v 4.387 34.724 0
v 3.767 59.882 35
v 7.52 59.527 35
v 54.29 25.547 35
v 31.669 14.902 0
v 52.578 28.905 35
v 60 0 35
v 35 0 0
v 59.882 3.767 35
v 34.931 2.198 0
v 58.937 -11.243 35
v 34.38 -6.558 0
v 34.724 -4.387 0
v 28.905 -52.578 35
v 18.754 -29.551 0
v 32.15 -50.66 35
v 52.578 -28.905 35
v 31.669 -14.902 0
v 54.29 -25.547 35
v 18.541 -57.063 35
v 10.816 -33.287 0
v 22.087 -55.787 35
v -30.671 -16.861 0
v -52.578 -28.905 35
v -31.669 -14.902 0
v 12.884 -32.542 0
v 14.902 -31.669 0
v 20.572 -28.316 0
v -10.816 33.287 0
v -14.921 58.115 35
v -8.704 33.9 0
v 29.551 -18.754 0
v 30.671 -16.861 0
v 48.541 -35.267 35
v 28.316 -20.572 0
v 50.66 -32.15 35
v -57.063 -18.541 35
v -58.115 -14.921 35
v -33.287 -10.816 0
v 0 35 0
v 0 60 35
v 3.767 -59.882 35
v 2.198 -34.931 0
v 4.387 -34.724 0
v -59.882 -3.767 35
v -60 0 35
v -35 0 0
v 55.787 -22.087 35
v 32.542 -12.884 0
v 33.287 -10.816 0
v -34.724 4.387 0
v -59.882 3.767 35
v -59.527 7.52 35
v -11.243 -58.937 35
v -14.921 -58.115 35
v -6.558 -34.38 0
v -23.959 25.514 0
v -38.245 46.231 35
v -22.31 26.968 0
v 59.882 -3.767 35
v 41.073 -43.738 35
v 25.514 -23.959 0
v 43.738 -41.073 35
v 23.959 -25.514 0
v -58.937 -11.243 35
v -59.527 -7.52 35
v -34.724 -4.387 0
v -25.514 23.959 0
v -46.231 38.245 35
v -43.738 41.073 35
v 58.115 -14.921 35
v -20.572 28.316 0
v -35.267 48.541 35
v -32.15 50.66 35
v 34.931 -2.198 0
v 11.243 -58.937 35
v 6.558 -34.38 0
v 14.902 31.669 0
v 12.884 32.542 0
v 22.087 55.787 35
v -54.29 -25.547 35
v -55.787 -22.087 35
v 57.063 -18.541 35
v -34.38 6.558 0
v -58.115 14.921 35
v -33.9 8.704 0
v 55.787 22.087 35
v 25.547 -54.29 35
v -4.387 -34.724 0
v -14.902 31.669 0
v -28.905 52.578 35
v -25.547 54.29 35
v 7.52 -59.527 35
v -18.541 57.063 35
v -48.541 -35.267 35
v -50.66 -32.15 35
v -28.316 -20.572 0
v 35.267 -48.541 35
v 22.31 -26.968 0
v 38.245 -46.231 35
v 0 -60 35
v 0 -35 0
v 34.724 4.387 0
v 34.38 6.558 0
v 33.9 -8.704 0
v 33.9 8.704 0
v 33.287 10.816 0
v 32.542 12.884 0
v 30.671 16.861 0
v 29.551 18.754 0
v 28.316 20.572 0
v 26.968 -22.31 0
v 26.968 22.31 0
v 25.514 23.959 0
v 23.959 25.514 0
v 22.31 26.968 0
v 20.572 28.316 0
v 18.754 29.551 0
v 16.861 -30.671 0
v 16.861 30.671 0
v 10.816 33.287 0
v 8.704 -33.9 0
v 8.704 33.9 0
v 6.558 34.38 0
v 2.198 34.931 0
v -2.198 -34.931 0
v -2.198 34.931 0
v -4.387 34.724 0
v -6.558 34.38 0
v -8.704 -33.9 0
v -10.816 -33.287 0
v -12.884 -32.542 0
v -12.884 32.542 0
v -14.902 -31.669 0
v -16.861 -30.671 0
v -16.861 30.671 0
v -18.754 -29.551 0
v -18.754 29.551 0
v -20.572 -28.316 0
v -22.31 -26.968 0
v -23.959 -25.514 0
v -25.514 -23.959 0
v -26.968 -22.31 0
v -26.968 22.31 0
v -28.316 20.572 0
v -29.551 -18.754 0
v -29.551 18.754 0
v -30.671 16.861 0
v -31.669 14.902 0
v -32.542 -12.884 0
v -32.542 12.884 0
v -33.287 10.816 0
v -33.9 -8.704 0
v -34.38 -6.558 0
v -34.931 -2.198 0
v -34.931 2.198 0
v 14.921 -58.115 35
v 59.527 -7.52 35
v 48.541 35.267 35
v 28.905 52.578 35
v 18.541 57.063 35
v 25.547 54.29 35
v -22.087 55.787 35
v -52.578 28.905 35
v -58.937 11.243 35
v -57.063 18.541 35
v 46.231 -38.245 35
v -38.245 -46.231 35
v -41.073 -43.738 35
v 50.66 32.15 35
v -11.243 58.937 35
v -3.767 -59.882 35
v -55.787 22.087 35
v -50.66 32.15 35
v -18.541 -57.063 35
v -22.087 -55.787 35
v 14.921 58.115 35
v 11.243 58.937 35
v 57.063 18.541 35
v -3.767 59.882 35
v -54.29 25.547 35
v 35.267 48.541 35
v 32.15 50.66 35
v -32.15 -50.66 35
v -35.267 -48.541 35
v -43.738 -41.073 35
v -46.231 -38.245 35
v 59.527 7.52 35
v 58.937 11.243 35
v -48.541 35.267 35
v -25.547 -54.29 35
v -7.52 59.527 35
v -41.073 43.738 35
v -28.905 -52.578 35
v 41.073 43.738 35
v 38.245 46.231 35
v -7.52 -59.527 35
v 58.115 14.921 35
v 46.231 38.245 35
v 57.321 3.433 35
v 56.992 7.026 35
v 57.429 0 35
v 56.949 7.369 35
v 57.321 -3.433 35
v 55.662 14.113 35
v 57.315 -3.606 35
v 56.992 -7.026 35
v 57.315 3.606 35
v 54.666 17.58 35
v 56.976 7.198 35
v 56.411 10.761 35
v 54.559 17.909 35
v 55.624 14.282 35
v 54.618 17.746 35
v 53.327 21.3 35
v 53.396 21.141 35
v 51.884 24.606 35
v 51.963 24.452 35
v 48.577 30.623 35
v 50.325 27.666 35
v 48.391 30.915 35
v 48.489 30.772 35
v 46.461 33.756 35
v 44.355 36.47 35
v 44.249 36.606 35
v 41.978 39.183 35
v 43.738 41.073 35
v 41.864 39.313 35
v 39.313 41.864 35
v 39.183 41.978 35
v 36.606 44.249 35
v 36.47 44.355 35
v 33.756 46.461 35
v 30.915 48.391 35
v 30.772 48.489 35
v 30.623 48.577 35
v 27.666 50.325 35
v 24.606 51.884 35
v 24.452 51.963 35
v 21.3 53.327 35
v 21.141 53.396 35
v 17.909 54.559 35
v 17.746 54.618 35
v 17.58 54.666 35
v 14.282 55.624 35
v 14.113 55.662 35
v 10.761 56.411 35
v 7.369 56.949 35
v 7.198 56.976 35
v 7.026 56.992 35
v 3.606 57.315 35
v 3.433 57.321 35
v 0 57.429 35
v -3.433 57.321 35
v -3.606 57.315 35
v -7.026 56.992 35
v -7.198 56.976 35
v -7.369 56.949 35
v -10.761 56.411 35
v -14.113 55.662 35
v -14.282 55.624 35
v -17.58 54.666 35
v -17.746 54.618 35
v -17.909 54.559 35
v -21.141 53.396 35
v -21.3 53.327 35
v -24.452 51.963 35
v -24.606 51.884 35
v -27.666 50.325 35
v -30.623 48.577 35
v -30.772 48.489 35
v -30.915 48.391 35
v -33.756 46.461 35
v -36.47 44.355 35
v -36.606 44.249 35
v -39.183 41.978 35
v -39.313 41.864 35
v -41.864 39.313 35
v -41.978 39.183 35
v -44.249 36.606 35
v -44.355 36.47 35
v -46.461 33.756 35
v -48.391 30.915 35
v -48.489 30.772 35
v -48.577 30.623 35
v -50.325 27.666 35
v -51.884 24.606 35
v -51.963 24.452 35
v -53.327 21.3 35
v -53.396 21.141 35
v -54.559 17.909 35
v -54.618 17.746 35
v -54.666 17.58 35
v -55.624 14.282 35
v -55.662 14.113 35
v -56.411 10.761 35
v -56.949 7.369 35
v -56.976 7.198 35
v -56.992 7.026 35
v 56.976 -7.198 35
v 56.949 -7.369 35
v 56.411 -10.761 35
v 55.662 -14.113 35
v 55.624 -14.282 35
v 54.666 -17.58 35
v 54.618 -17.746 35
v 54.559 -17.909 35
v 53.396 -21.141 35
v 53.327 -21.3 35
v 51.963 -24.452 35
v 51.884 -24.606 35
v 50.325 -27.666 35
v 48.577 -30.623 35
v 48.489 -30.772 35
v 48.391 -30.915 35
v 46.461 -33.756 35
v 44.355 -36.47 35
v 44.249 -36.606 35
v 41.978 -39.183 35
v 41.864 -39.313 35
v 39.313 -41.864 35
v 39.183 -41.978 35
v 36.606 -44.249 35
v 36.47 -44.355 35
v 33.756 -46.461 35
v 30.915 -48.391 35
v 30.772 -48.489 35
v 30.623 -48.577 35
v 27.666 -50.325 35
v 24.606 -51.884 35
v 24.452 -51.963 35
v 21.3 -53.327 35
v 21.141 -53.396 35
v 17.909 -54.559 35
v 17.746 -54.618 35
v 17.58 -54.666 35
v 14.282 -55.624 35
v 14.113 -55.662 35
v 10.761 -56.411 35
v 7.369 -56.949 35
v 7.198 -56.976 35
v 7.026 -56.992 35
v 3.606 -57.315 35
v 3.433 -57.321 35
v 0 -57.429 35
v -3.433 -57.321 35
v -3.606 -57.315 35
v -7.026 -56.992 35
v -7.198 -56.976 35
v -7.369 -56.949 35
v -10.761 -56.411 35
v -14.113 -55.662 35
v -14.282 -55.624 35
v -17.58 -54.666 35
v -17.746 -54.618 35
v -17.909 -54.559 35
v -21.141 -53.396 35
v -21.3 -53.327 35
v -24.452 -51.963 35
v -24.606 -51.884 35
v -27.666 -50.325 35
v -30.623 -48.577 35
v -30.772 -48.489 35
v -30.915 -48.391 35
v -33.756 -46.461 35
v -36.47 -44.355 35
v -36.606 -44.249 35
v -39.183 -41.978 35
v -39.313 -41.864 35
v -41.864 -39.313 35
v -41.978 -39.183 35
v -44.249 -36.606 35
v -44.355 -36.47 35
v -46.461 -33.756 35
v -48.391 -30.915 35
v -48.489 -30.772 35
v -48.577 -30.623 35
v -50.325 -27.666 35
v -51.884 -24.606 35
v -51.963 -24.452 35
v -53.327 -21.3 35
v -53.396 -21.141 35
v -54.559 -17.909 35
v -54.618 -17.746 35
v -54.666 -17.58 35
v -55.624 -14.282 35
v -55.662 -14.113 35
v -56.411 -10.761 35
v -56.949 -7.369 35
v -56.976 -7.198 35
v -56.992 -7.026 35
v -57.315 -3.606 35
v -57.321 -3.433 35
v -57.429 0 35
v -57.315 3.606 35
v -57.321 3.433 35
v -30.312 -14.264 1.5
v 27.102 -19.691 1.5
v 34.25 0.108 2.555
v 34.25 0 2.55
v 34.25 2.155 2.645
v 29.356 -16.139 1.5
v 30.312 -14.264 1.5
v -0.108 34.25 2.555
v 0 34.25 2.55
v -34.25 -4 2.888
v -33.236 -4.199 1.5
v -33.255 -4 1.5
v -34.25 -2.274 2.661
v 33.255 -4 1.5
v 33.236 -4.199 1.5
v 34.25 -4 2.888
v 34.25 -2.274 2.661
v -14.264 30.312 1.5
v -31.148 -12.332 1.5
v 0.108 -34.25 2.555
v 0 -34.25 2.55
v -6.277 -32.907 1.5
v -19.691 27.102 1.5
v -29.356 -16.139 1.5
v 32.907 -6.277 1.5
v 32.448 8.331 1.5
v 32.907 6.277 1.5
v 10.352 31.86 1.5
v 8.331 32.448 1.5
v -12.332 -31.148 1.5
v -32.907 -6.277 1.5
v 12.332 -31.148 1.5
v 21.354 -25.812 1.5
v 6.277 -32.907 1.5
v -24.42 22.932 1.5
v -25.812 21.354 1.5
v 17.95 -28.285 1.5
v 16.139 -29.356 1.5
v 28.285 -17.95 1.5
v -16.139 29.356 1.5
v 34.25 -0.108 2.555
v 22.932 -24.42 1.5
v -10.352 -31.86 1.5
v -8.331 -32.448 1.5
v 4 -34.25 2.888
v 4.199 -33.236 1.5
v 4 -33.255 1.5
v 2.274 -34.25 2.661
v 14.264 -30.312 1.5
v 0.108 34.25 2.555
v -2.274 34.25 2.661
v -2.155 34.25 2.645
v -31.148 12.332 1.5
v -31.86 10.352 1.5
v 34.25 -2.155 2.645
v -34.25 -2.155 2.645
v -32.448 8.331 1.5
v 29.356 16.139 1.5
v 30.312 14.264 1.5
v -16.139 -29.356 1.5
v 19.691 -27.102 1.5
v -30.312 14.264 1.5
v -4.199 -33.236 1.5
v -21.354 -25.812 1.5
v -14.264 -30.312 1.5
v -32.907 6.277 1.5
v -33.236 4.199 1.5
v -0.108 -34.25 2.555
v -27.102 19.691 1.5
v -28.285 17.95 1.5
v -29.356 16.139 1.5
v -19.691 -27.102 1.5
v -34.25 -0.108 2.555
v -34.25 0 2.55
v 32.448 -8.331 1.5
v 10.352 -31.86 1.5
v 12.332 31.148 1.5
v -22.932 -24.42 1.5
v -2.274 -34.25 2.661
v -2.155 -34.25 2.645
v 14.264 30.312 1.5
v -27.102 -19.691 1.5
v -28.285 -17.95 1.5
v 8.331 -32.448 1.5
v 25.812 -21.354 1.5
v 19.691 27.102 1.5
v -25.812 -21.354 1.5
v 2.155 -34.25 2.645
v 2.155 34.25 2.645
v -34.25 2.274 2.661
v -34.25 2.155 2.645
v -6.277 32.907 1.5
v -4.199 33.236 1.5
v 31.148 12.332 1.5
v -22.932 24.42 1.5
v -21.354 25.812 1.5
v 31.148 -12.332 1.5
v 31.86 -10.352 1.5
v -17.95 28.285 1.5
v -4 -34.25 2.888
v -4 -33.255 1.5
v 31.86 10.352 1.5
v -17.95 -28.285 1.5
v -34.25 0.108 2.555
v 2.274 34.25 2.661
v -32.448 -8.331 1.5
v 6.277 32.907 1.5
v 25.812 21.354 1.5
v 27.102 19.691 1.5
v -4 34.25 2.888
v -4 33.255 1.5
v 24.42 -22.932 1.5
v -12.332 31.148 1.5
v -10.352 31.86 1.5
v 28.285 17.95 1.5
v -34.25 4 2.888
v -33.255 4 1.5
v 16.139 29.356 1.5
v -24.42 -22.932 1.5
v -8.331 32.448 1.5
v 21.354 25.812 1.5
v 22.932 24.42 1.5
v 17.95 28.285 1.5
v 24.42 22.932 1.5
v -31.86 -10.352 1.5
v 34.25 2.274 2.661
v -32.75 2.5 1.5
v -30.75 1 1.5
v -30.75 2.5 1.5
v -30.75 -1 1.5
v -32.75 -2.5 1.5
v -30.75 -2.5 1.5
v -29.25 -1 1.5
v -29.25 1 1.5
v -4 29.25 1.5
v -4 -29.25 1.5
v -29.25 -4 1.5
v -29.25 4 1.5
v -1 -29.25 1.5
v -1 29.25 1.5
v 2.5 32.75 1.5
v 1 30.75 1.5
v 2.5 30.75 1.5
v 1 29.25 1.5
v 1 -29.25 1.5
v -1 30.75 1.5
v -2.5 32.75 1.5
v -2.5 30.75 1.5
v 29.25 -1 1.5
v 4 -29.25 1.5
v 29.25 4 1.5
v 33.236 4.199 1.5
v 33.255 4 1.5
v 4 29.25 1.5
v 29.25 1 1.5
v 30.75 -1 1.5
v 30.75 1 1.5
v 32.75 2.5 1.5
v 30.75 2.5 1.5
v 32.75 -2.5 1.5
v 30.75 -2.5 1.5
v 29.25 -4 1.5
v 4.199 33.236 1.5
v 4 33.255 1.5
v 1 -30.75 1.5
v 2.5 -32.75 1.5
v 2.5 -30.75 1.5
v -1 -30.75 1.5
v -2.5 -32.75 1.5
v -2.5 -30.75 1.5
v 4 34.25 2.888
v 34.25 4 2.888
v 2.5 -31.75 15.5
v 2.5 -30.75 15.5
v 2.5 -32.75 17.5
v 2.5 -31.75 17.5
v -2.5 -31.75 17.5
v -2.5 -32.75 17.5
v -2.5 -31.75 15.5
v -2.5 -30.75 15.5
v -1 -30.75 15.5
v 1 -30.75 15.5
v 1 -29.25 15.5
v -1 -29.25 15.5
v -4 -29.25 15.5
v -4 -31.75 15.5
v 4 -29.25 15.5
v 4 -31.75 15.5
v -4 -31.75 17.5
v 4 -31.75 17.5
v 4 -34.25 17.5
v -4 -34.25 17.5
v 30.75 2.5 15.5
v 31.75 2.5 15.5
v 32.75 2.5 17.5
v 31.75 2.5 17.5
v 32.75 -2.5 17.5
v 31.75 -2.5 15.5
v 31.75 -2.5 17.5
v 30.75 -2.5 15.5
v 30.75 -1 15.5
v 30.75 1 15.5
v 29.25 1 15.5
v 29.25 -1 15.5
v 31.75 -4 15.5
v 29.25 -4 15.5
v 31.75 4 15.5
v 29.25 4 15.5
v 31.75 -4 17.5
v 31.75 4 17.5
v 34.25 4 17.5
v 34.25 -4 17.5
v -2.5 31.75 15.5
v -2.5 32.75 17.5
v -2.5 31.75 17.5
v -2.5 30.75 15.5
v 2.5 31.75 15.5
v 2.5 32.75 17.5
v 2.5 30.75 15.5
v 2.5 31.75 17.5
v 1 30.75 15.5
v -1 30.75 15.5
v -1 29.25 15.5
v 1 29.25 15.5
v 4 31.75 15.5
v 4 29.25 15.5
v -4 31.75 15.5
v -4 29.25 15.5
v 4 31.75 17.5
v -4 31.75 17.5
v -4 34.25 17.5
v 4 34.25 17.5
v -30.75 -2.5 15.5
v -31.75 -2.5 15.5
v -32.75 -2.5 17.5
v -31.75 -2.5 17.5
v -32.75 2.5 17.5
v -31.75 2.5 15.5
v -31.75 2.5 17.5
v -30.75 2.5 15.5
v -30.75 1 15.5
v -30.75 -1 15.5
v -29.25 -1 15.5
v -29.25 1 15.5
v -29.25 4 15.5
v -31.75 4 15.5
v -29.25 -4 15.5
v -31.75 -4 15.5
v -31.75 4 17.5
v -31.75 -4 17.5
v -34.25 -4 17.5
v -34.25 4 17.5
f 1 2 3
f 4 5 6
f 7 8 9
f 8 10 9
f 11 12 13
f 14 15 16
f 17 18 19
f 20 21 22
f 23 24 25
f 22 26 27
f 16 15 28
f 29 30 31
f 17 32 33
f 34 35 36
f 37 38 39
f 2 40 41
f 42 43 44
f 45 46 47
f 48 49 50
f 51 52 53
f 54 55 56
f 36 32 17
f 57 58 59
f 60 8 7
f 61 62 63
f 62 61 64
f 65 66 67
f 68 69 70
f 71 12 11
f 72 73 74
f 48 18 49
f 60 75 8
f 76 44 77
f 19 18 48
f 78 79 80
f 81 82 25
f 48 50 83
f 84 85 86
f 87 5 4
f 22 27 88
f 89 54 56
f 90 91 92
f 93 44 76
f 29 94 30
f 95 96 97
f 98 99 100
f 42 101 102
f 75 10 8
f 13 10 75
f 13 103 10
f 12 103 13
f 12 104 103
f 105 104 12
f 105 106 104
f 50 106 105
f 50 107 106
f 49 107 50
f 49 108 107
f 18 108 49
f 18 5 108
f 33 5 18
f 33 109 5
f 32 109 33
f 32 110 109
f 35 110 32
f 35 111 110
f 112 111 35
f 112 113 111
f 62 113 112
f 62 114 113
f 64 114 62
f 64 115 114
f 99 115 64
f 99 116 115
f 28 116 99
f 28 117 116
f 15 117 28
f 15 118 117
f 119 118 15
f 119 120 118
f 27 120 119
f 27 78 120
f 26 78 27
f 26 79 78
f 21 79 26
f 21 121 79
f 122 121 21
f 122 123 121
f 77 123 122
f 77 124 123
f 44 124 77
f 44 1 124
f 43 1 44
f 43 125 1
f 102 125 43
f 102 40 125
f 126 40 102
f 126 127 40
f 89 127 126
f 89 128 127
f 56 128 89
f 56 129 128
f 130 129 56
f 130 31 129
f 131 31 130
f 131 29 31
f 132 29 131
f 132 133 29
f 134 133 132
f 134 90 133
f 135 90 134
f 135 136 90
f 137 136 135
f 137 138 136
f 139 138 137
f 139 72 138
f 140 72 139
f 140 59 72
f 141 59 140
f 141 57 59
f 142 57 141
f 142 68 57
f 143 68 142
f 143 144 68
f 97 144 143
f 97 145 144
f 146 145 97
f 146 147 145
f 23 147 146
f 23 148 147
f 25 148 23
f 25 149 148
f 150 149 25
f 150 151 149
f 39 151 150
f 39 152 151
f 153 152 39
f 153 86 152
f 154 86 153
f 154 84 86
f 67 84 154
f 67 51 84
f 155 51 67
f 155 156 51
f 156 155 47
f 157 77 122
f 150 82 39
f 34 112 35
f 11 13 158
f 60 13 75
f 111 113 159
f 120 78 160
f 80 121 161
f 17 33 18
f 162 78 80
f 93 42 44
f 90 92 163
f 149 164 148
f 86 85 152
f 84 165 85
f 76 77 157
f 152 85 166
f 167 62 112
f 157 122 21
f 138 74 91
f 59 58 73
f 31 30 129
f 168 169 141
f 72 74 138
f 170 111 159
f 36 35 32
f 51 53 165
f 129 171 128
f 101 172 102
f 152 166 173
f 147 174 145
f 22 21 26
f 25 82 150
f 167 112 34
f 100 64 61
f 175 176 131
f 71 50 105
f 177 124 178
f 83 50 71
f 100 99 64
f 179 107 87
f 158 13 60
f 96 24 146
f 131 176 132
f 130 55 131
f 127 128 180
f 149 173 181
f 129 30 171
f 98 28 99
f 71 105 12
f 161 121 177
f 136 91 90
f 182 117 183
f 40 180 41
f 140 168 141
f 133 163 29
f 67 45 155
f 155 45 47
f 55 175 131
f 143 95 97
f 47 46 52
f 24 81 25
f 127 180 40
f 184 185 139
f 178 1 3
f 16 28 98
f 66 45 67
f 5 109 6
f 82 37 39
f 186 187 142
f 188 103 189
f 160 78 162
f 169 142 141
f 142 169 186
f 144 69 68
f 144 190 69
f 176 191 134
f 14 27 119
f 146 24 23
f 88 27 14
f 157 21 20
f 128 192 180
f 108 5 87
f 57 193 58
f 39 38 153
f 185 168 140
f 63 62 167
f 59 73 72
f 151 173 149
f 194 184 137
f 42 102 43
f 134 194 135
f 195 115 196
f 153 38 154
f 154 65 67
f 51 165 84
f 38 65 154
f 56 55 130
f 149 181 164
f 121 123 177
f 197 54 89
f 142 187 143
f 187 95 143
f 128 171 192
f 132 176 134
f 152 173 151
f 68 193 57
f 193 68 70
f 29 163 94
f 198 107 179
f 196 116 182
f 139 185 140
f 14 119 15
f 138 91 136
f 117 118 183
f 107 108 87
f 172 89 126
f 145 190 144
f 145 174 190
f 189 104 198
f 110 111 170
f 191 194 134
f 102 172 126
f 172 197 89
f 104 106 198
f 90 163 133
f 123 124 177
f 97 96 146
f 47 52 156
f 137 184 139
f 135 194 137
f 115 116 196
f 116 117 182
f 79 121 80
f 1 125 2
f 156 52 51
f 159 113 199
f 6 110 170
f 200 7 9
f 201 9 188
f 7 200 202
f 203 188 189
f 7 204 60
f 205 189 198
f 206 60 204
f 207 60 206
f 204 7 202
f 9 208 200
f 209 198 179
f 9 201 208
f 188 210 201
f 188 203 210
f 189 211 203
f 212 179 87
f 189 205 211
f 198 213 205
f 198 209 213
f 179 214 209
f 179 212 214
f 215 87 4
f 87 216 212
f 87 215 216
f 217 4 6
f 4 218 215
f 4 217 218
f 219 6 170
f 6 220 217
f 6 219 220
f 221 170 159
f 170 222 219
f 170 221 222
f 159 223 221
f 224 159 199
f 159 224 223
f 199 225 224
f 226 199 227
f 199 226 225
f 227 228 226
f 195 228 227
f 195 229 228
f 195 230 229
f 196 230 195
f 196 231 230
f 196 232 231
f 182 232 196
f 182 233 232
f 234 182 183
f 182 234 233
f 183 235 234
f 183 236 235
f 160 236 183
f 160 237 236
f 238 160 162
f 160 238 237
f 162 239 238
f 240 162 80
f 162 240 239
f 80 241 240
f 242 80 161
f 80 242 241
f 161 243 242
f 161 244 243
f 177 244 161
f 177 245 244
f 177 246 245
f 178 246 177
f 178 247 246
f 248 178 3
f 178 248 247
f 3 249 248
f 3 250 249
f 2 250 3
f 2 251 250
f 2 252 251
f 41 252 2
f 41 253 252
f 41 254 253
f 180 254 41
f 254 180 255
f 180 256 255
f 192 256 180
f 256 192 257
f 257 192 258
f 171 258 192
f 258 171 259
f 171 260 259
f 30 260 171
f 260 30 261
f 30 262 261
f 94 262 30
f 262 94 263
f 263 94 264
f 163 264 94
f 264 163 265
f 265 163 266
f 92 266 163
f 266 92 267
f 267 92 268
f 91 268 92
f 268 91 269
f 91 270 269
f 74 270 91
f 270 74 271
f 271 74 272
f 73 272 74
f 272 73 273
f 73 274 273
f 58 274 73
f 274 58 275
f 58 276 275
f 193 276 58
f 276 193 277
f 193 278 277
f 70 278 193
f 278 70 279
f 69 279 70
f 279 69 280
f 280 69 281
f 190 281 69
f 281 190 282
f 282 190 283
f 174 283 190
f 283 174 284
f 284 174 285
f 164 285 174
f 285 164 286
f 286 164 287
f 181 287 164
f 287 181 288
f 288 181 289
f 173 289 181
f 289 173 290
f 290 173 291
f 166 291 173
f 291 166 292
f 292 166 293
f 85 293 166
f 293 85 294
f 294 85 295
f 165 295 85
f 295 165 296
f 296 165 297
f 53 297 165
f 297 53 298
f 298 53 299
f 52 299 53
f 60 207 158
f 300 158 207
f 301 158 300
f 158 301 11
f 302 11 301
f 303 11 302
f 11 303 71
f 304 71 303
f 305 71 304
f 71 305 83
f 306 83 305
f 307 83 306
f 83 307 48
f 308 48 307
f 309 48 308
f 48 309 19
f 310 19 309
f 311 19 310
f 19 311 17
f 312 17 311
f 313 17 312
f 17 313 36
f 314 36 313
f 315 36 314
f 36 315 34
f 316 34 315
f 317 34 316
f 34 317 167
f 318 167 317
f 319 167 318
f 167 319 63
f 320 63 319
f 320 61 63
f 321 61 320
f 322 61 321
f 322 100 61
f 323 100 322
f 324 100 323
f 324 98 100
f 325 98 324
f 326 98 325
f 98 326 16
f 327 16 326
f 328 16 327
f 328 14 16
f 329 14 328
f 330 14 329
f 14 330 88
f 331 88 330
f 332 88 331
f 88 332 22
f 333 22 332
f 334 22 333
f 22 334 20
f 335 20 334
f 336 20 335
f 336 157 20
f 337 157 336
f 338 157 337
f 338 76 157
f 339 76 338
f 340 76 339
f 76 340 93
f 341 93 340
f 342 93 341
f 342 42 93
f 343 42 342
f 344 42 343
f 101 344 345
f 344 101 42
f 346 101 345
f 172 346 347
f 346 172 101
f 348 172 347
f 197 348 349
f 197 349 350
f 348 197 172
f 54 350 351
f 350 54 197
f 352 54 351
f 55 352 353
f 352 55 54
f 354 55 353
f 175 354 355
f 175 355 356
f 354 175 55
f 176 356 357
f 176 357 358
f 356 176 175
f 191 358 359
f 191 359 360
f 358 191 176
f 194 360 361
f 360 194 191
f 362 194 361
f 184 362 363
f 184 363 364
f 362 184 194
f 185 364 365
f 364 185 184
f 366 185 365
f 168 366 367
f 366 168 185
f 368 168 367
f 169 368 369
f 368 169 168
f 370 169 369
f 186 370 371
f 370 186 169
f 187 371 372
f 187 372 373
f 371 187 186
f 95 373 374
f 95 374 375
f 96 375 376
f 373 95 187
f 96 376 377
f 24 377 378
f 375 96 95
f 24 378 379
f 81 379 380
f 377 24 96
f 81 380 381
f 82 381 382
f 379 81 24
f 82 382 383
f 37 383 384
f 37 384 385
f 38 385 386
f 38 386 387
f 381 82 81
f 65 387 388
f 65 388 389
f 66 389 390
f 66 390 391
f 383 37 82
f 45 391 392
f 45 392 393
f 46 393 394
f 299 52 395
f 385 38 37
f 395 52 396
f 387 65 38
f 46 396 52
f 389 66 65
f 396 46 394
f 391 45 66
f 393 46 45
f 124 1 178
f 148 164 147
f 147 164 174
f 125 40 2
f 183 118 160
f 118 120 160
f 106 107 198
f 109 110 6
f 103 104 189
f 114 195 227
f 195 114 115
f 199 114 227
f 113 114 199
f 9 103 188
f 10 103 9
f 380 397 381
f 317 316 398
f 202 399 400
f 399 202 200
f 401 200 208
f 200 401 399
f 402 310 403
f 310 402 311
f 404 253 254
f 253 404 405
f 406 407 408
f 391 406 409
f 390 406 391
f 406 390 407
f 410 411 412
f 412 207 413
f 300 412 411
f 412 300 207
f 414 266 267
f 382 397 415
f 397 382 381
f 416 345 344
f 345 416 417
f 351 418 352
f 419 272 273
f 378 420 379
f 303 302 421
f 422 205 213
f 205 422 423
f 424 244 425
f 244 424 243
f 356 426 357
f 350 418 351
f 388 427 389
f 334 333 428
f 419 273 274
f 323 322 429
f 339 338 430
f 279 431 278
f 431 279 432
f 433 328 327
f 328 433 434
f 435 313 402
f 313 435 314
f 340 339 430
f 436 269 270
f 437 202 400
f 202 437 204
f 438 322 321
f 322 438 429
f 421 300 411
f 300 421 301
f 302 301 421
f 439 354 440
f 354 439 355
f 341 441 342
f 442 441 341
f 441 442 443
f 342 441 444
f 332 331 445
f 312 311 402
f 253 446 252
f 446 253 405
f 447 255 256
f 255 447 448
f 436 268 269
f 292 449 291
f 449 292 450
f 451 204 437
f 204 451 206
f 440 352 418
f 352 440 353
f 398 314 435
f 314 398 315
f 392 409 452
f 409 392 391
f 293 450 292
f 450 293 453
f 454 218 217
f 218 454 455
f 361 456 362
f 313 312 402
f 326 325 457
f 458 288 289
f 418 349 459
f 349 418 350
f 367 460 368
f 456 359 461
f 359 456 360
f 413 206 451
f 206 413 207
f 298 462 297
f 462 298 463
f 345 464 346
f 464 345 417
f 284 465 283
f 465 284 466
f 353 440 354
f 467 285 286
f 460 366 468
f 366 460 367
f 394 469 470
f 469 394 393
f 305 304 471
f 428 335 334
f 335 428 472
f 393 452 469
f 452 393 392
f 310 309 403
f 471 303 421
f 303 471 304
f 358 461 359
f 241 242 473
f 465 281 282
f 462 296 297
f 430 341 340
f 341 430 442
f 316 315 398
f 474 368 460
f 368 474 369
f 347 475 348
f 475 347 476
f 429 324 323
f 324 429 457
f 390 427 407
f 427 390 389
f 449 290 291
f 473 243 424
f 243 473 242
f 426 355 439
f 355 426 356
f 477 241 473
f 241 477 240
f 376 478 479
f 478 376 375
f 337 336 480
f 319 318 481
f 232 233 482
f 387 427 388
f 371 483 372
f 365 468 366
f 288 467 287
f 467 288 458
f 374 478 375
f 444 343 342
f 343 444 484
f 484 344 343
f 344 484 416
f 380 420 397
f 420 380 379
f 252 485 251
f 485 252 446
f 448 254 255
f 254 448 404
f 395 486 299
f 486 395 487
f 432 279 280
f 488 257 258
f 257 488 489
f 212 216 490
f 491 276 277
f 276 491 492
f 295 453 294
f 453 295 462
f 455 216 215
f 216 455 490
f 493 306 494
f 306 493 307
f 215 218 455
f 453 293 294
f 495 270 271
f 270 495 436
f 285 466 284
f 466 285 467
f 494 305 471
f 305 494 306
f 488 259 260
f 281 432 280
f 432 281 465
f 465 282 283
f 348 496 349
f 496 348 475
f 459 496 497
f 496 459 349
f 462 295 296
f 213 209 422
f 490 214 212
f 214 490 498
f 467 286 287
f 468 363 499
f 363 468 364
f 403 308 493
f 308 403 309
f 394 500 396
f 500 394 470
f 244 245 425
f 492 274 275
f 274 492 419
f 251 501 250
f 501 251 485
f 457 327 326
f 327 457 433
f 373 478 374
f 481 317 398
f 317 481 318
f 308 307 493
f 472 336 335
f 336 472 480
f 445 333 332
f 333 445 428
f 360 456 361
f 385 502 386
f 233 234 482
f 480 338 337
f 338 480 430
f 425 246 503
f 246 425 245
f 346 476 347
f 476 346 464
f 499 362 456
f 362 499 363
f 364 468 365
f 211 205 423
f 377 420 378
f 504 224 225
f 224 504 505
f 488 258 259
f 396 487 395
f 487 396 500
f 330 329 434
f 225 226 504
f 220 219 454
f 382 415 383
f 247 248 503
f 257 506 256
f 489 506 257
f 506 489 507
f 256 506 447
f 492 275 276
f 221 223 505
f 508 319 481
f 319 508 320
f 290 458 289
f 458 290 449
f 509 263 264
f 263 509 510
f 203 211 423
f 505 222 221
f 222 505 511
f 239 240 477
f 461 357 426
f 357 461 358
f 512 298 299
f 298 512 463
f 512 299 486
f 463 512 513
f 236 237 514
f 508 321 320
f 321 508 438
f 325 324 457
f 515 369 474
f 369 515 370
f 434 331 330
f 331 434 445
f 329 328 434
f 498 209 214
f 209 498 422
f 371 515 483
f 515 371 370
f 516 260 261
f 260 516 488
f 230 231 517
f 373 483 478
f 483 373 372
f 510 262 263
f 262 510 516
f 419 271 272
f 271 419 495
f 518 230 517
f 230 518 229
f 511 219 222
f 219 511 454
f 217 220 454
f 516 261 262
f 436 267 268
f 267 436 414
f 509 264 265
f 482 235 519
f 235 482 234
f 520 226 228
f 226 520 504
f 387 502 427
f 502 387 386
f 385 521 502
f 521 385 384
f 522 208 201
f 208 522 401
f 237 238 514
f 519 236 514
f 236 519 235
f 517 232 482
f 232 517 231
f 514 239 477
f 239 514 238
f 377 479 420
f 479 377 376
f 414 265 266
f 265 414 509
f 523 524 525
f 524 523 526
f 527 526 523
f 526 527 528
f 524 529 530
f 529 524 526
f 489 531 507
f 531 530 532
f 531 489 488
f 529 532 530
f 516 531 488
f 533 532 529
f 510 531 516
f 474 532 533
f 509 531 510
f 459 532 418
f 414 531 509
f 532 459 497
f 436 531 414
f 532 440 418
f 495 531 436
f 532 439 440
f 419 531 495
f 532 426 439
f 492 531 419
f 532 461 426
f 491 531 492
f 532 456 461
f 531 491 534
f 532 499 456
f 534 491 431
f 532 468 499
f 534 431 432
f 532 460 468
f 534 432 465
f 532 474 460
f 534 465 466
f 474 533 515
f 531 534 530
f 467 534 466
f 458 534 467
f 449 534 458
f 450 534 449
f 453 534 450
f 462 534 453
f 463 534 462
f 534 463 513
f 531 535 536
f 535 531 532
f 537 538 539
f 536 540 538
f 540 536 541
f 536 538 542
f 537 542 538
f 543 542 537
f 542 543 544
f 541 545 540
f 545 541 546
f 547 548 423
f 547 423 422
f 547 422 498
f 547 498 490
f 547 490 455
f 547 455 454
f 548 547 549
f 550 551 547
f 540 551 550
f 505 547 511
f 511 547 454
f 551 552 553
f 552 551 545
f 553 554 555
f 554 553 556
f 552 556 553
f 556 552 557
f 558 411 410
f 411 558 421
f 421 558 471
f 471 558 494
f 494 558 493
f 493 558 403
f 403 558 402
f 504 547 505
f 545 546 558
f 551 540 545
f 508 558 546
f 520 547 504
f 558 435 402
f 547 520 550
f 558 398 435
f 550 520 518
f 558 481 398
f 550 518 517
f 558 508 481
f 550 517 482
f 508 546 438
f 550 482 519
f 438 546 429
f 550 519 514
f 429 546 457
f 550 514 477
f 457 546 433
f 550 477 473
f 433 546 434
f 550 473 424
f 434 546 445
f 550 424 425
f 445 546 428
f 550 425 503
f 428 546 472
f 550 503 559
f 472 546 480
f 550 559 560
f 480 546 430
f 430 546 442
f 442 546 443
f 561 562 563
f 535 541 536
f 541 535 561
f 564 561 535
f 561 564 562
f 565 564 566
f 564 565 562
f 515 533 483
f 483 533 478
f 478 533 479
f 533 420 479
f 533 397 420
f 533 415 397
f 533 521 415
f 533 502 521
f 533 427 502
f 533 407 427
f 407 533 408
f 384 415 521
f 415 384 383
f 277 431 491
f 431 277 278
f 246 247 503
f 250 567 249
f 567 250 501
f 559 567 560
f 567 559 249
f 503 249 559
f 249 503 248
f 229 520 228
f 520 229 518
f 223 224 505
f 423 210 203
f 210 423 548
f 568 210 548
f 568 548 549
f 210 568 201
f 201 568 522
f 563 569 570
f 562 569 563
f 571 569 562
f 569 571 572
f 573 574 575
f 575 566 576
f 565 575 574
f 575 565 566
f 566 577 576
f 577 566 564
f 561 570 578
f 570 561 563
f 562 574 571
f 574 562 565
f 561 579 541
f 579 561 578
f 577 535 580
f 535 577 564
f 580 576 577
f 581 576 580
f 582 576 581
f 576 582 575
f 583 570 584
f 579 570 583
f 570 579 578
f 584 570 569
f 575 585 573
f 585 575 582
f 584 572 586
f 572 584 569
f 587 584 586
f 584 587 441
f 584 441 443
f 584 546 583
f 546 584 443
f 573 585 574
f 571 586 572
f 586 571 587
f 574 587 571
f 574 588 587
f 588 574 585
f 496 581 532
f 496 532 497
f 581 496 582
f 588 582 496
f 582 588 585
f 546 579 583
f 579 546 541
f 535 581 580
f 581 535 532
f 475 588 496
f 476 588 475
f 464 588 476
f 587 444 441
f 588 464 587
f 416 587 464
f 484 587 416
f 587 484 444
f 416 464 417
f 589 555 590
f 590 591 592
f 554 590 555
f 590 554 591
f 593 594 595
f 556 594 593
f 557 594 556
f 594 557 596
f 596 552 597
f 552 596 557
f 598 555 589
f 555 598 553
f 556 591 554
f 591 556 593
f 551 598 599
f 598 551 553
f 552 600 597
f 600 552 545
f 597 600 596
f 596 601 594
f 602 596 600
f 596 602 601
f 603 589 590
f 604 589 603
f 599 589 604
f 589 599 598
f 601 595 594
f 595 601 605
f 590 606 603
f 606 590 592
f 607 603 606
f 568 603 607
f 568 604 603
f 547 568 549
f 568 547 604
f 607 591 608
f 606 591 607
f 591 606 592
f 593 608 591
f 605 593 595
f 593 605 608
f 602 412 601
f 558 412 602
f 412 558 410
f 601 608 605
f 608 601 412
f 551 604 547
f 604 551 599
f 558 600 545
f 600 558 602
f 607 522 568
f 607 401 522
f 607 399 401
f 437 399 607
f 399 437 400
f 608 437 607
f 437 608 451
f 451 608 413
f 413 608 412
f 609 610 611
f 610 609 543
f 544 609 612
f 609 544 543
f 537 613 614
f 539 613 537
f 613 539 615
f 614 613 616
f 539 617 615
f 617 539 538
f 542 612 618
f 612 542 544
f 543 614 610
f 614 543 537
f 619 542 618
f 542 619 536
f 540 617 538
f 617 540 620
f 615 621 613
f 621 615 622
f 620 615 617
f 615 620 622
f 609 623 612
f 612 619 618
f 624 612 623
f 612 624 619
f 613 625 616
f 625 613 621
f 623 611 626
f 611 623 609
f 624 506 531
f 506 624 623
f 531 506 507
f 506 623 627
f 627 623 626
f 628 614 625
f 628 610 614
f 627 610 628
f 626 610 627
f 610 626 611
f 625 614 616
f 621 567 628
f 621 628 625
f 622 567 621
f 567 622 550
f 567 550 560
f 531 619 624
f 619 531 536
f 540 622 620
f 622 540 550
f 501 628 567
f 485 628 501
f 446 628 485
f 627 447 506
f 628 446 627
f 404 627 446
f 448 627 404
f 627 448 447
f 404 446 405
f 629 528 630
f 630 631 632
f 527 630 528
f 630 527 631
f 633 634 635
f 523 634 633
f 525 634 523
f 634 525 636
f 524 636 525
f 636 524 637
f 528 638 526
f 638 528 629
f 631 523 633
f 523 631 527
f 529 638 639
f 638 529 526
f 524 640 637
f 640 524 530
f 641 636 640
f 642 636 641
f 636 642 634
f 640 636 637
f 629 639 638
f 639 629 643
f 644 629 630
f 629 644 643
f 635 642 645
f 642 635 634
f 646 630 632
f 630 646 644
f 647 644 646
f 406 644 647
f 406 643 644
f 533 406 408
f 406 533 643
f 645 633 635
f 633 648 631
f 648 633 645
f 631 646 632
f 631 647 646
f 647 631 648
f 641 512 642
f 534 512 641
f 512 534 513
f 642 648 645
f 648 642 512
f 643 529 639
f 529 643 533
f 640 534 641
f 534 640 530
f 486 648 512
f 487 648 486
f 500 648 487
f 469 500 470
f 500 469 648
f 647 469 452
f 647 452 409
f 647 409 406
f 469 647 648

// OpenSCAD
$fn=100;

// all in mm
d_wall = 1.5;
r_outer = 60;
r_inner = 35;
h_cap = 35;
cap_sep = 0.5*h_cap; // separation distance (as fraction of h_cap)
n_caps = 4;
p_w = 8;
p_d = 5;
p_o_w = 5;
p_o_d = 2;
p_o_s_w = 2;

nut_h = 4;
nut_r = 2.5;
nut_re = 9.2/2;
nut_margin = 0.1;

// define modules
module cap() {
  difference() {
  cylinder(r=r_inner, r2=r_outer, h=h_cap);
  t = (r_outer - d_wall - r_inner + d_wall) / h_cap;
  h = 5;
  r_i = r_inner - t * h - d_wall;
  r_o = t * h + r_outer - d_wall;
  translate([0,0,-h]) cylinder(r1=r_i, r2= r_o, h=h_cap+2*h);
  }
}

module profile(h) {
  //translate([p_w/2,0,0])
  difference() {
    cube([p_w, p_d, h]);
    union() {
      translate([(p_w-p_o_w)/2,(p_d-p_o_d)/2,-0.25*h]) cube([p_o_w, p_o_d, 1.5*h]);
      translate([(p_w-p_o_s_w)/2,p_d-1.5*(p_d-p_o_d)/2,-0.25*h]) cube([p_o_s_w, 2*p_o_d, 1.5*h]);
      color("blue") translate([-p_w/2,p_d/2,h-2]) cube([2*p_w, p_d, 4]);
    }
  }
  
}

module top_cap() {
  t = h_cap / (r_outer - r_inner);
  dr = (h_cap + d_wall) / t;
  ro = r_inner - d_wall + dr;
  difference() {
    cylinder(r1=r_inner, r2=r_outer, h=h_cap);
    translate([0,0,d_wall]) cylinder(r1=r_inner-d_wall, r2=ro, h=h_cap+d_wall);
  }
  //translate([0,0,-h_cap/6]) cylinder(r1=0, r2=r_inner, h=h_cap/6);
  for(i=[0:90:360]){
    rotate(v=[0,0,1], a=i) translate([-p_w/2,-r_inner+d_wall/2,0]) profile(h=cap_sep);
  }
}

module buttom_cap() {
  t = h_cap / (r_outer - d_wall - r_inner + d_wall);
  r_o = r_outer - d_wall;
  difference() {
    union() {
      difference(){
        difference() {
          cylinder(r1=r_inner, r2=r_outer, h=h_cap);
          translate([0,0,-t*r_o + h_cap - d_wall]) cylinder(r1=0, r2= r_o, h=t*r_o);
        }
        color("red") translate([0,0,h_cap-2*d_wall]) cylinder(r1=r_inner-d_wall, r2=r_inner, h=8*d_wall);
      }
      for(i = [0:90:360-45]) {
        rotate(a=i, v=[0,0,1]) translate([r_inner, -1.5*nut_re, h_cap-nut_h-d_wall]) nut_support();
      }
    }
    union() {
      for(i = [0:90:360-45]) {
        rotate(a=i, v=[0,0,1]) translate([r_inner+1.5*nut_re, 0, h_cap - nut_h]) scale([1,1,2]) nut(h=nut_h, rh=nut_r, re=nut_re, margin=nut_margin);
        rotate(a=i, v=[0,0,1]) translate([r_inner+1.5*nut_re, 0, h_cap]) cylinder(r=nut_r + nut_margin, h=3*nut_h, center=true);
      }
    }
  }
}


module nut(h, rh, re, margin) {
// h height of nut
// r radius of screw wire
// w width of nut between two horizontal sides

r = rh + margin;
ro = re + margin;
order = 6;
angles=[ for (i = [0:order-1]) i*(360/order) ];
   coords=[ for (th=angles) [ro*cos(th), ro*sin(th)] ];
   linear_extrude(height=h)
   difference(){
   
  polygon(coords);
  circle(r=r);
   }
}

module nut2(h, r, w, margin) {
// h height of nut
// r radius of screw wire
// w width of nut between two horizontal sides

s = w/(2 * sin(30));
x = w/(2 * tan(30));
ro = w/2+x + margin;
order = 6;
angles=[ for (i = [0:order-1]) i*(360/order) ];
   coords=[ for (th=angles) [ro*cos(th), ro*sin(th)] ];
   linear_extrude(height=h)
   difference(){
   
  polygon(coords);
  circle(r=r);
   }
}

module nut_support() {
h = nut_h + d_wall;
t = h_cap / (r_outer - r_inner);
dr = h / t;
ri = r_outer - dr;
translate([-r_inner,1.5*nut_re,0])
difference(){
  intersection() {
    cylinder(r1=ri, r2=r_outer, h=h);
    //translate([0,0,-t*r_o + h_cap - d_wall]) cylinder(r1=0, r2= r_o, h=t*r_o);
    translate([0,-1.5*nut_re,-nut_h/2]) cube([2*r_outer, 3*nut_re, 2*h]);
  }
  cube([2*r_inner, 5*nut_re, 6*nut_h], center=true);
  //color("red") translate([0,0,h_cap-2*d_wall]) cylinder(r1=r_inner-d_wall, r2=r_inner, h=8*d_wall);
}
}


// draw actual shape

top_cap();
